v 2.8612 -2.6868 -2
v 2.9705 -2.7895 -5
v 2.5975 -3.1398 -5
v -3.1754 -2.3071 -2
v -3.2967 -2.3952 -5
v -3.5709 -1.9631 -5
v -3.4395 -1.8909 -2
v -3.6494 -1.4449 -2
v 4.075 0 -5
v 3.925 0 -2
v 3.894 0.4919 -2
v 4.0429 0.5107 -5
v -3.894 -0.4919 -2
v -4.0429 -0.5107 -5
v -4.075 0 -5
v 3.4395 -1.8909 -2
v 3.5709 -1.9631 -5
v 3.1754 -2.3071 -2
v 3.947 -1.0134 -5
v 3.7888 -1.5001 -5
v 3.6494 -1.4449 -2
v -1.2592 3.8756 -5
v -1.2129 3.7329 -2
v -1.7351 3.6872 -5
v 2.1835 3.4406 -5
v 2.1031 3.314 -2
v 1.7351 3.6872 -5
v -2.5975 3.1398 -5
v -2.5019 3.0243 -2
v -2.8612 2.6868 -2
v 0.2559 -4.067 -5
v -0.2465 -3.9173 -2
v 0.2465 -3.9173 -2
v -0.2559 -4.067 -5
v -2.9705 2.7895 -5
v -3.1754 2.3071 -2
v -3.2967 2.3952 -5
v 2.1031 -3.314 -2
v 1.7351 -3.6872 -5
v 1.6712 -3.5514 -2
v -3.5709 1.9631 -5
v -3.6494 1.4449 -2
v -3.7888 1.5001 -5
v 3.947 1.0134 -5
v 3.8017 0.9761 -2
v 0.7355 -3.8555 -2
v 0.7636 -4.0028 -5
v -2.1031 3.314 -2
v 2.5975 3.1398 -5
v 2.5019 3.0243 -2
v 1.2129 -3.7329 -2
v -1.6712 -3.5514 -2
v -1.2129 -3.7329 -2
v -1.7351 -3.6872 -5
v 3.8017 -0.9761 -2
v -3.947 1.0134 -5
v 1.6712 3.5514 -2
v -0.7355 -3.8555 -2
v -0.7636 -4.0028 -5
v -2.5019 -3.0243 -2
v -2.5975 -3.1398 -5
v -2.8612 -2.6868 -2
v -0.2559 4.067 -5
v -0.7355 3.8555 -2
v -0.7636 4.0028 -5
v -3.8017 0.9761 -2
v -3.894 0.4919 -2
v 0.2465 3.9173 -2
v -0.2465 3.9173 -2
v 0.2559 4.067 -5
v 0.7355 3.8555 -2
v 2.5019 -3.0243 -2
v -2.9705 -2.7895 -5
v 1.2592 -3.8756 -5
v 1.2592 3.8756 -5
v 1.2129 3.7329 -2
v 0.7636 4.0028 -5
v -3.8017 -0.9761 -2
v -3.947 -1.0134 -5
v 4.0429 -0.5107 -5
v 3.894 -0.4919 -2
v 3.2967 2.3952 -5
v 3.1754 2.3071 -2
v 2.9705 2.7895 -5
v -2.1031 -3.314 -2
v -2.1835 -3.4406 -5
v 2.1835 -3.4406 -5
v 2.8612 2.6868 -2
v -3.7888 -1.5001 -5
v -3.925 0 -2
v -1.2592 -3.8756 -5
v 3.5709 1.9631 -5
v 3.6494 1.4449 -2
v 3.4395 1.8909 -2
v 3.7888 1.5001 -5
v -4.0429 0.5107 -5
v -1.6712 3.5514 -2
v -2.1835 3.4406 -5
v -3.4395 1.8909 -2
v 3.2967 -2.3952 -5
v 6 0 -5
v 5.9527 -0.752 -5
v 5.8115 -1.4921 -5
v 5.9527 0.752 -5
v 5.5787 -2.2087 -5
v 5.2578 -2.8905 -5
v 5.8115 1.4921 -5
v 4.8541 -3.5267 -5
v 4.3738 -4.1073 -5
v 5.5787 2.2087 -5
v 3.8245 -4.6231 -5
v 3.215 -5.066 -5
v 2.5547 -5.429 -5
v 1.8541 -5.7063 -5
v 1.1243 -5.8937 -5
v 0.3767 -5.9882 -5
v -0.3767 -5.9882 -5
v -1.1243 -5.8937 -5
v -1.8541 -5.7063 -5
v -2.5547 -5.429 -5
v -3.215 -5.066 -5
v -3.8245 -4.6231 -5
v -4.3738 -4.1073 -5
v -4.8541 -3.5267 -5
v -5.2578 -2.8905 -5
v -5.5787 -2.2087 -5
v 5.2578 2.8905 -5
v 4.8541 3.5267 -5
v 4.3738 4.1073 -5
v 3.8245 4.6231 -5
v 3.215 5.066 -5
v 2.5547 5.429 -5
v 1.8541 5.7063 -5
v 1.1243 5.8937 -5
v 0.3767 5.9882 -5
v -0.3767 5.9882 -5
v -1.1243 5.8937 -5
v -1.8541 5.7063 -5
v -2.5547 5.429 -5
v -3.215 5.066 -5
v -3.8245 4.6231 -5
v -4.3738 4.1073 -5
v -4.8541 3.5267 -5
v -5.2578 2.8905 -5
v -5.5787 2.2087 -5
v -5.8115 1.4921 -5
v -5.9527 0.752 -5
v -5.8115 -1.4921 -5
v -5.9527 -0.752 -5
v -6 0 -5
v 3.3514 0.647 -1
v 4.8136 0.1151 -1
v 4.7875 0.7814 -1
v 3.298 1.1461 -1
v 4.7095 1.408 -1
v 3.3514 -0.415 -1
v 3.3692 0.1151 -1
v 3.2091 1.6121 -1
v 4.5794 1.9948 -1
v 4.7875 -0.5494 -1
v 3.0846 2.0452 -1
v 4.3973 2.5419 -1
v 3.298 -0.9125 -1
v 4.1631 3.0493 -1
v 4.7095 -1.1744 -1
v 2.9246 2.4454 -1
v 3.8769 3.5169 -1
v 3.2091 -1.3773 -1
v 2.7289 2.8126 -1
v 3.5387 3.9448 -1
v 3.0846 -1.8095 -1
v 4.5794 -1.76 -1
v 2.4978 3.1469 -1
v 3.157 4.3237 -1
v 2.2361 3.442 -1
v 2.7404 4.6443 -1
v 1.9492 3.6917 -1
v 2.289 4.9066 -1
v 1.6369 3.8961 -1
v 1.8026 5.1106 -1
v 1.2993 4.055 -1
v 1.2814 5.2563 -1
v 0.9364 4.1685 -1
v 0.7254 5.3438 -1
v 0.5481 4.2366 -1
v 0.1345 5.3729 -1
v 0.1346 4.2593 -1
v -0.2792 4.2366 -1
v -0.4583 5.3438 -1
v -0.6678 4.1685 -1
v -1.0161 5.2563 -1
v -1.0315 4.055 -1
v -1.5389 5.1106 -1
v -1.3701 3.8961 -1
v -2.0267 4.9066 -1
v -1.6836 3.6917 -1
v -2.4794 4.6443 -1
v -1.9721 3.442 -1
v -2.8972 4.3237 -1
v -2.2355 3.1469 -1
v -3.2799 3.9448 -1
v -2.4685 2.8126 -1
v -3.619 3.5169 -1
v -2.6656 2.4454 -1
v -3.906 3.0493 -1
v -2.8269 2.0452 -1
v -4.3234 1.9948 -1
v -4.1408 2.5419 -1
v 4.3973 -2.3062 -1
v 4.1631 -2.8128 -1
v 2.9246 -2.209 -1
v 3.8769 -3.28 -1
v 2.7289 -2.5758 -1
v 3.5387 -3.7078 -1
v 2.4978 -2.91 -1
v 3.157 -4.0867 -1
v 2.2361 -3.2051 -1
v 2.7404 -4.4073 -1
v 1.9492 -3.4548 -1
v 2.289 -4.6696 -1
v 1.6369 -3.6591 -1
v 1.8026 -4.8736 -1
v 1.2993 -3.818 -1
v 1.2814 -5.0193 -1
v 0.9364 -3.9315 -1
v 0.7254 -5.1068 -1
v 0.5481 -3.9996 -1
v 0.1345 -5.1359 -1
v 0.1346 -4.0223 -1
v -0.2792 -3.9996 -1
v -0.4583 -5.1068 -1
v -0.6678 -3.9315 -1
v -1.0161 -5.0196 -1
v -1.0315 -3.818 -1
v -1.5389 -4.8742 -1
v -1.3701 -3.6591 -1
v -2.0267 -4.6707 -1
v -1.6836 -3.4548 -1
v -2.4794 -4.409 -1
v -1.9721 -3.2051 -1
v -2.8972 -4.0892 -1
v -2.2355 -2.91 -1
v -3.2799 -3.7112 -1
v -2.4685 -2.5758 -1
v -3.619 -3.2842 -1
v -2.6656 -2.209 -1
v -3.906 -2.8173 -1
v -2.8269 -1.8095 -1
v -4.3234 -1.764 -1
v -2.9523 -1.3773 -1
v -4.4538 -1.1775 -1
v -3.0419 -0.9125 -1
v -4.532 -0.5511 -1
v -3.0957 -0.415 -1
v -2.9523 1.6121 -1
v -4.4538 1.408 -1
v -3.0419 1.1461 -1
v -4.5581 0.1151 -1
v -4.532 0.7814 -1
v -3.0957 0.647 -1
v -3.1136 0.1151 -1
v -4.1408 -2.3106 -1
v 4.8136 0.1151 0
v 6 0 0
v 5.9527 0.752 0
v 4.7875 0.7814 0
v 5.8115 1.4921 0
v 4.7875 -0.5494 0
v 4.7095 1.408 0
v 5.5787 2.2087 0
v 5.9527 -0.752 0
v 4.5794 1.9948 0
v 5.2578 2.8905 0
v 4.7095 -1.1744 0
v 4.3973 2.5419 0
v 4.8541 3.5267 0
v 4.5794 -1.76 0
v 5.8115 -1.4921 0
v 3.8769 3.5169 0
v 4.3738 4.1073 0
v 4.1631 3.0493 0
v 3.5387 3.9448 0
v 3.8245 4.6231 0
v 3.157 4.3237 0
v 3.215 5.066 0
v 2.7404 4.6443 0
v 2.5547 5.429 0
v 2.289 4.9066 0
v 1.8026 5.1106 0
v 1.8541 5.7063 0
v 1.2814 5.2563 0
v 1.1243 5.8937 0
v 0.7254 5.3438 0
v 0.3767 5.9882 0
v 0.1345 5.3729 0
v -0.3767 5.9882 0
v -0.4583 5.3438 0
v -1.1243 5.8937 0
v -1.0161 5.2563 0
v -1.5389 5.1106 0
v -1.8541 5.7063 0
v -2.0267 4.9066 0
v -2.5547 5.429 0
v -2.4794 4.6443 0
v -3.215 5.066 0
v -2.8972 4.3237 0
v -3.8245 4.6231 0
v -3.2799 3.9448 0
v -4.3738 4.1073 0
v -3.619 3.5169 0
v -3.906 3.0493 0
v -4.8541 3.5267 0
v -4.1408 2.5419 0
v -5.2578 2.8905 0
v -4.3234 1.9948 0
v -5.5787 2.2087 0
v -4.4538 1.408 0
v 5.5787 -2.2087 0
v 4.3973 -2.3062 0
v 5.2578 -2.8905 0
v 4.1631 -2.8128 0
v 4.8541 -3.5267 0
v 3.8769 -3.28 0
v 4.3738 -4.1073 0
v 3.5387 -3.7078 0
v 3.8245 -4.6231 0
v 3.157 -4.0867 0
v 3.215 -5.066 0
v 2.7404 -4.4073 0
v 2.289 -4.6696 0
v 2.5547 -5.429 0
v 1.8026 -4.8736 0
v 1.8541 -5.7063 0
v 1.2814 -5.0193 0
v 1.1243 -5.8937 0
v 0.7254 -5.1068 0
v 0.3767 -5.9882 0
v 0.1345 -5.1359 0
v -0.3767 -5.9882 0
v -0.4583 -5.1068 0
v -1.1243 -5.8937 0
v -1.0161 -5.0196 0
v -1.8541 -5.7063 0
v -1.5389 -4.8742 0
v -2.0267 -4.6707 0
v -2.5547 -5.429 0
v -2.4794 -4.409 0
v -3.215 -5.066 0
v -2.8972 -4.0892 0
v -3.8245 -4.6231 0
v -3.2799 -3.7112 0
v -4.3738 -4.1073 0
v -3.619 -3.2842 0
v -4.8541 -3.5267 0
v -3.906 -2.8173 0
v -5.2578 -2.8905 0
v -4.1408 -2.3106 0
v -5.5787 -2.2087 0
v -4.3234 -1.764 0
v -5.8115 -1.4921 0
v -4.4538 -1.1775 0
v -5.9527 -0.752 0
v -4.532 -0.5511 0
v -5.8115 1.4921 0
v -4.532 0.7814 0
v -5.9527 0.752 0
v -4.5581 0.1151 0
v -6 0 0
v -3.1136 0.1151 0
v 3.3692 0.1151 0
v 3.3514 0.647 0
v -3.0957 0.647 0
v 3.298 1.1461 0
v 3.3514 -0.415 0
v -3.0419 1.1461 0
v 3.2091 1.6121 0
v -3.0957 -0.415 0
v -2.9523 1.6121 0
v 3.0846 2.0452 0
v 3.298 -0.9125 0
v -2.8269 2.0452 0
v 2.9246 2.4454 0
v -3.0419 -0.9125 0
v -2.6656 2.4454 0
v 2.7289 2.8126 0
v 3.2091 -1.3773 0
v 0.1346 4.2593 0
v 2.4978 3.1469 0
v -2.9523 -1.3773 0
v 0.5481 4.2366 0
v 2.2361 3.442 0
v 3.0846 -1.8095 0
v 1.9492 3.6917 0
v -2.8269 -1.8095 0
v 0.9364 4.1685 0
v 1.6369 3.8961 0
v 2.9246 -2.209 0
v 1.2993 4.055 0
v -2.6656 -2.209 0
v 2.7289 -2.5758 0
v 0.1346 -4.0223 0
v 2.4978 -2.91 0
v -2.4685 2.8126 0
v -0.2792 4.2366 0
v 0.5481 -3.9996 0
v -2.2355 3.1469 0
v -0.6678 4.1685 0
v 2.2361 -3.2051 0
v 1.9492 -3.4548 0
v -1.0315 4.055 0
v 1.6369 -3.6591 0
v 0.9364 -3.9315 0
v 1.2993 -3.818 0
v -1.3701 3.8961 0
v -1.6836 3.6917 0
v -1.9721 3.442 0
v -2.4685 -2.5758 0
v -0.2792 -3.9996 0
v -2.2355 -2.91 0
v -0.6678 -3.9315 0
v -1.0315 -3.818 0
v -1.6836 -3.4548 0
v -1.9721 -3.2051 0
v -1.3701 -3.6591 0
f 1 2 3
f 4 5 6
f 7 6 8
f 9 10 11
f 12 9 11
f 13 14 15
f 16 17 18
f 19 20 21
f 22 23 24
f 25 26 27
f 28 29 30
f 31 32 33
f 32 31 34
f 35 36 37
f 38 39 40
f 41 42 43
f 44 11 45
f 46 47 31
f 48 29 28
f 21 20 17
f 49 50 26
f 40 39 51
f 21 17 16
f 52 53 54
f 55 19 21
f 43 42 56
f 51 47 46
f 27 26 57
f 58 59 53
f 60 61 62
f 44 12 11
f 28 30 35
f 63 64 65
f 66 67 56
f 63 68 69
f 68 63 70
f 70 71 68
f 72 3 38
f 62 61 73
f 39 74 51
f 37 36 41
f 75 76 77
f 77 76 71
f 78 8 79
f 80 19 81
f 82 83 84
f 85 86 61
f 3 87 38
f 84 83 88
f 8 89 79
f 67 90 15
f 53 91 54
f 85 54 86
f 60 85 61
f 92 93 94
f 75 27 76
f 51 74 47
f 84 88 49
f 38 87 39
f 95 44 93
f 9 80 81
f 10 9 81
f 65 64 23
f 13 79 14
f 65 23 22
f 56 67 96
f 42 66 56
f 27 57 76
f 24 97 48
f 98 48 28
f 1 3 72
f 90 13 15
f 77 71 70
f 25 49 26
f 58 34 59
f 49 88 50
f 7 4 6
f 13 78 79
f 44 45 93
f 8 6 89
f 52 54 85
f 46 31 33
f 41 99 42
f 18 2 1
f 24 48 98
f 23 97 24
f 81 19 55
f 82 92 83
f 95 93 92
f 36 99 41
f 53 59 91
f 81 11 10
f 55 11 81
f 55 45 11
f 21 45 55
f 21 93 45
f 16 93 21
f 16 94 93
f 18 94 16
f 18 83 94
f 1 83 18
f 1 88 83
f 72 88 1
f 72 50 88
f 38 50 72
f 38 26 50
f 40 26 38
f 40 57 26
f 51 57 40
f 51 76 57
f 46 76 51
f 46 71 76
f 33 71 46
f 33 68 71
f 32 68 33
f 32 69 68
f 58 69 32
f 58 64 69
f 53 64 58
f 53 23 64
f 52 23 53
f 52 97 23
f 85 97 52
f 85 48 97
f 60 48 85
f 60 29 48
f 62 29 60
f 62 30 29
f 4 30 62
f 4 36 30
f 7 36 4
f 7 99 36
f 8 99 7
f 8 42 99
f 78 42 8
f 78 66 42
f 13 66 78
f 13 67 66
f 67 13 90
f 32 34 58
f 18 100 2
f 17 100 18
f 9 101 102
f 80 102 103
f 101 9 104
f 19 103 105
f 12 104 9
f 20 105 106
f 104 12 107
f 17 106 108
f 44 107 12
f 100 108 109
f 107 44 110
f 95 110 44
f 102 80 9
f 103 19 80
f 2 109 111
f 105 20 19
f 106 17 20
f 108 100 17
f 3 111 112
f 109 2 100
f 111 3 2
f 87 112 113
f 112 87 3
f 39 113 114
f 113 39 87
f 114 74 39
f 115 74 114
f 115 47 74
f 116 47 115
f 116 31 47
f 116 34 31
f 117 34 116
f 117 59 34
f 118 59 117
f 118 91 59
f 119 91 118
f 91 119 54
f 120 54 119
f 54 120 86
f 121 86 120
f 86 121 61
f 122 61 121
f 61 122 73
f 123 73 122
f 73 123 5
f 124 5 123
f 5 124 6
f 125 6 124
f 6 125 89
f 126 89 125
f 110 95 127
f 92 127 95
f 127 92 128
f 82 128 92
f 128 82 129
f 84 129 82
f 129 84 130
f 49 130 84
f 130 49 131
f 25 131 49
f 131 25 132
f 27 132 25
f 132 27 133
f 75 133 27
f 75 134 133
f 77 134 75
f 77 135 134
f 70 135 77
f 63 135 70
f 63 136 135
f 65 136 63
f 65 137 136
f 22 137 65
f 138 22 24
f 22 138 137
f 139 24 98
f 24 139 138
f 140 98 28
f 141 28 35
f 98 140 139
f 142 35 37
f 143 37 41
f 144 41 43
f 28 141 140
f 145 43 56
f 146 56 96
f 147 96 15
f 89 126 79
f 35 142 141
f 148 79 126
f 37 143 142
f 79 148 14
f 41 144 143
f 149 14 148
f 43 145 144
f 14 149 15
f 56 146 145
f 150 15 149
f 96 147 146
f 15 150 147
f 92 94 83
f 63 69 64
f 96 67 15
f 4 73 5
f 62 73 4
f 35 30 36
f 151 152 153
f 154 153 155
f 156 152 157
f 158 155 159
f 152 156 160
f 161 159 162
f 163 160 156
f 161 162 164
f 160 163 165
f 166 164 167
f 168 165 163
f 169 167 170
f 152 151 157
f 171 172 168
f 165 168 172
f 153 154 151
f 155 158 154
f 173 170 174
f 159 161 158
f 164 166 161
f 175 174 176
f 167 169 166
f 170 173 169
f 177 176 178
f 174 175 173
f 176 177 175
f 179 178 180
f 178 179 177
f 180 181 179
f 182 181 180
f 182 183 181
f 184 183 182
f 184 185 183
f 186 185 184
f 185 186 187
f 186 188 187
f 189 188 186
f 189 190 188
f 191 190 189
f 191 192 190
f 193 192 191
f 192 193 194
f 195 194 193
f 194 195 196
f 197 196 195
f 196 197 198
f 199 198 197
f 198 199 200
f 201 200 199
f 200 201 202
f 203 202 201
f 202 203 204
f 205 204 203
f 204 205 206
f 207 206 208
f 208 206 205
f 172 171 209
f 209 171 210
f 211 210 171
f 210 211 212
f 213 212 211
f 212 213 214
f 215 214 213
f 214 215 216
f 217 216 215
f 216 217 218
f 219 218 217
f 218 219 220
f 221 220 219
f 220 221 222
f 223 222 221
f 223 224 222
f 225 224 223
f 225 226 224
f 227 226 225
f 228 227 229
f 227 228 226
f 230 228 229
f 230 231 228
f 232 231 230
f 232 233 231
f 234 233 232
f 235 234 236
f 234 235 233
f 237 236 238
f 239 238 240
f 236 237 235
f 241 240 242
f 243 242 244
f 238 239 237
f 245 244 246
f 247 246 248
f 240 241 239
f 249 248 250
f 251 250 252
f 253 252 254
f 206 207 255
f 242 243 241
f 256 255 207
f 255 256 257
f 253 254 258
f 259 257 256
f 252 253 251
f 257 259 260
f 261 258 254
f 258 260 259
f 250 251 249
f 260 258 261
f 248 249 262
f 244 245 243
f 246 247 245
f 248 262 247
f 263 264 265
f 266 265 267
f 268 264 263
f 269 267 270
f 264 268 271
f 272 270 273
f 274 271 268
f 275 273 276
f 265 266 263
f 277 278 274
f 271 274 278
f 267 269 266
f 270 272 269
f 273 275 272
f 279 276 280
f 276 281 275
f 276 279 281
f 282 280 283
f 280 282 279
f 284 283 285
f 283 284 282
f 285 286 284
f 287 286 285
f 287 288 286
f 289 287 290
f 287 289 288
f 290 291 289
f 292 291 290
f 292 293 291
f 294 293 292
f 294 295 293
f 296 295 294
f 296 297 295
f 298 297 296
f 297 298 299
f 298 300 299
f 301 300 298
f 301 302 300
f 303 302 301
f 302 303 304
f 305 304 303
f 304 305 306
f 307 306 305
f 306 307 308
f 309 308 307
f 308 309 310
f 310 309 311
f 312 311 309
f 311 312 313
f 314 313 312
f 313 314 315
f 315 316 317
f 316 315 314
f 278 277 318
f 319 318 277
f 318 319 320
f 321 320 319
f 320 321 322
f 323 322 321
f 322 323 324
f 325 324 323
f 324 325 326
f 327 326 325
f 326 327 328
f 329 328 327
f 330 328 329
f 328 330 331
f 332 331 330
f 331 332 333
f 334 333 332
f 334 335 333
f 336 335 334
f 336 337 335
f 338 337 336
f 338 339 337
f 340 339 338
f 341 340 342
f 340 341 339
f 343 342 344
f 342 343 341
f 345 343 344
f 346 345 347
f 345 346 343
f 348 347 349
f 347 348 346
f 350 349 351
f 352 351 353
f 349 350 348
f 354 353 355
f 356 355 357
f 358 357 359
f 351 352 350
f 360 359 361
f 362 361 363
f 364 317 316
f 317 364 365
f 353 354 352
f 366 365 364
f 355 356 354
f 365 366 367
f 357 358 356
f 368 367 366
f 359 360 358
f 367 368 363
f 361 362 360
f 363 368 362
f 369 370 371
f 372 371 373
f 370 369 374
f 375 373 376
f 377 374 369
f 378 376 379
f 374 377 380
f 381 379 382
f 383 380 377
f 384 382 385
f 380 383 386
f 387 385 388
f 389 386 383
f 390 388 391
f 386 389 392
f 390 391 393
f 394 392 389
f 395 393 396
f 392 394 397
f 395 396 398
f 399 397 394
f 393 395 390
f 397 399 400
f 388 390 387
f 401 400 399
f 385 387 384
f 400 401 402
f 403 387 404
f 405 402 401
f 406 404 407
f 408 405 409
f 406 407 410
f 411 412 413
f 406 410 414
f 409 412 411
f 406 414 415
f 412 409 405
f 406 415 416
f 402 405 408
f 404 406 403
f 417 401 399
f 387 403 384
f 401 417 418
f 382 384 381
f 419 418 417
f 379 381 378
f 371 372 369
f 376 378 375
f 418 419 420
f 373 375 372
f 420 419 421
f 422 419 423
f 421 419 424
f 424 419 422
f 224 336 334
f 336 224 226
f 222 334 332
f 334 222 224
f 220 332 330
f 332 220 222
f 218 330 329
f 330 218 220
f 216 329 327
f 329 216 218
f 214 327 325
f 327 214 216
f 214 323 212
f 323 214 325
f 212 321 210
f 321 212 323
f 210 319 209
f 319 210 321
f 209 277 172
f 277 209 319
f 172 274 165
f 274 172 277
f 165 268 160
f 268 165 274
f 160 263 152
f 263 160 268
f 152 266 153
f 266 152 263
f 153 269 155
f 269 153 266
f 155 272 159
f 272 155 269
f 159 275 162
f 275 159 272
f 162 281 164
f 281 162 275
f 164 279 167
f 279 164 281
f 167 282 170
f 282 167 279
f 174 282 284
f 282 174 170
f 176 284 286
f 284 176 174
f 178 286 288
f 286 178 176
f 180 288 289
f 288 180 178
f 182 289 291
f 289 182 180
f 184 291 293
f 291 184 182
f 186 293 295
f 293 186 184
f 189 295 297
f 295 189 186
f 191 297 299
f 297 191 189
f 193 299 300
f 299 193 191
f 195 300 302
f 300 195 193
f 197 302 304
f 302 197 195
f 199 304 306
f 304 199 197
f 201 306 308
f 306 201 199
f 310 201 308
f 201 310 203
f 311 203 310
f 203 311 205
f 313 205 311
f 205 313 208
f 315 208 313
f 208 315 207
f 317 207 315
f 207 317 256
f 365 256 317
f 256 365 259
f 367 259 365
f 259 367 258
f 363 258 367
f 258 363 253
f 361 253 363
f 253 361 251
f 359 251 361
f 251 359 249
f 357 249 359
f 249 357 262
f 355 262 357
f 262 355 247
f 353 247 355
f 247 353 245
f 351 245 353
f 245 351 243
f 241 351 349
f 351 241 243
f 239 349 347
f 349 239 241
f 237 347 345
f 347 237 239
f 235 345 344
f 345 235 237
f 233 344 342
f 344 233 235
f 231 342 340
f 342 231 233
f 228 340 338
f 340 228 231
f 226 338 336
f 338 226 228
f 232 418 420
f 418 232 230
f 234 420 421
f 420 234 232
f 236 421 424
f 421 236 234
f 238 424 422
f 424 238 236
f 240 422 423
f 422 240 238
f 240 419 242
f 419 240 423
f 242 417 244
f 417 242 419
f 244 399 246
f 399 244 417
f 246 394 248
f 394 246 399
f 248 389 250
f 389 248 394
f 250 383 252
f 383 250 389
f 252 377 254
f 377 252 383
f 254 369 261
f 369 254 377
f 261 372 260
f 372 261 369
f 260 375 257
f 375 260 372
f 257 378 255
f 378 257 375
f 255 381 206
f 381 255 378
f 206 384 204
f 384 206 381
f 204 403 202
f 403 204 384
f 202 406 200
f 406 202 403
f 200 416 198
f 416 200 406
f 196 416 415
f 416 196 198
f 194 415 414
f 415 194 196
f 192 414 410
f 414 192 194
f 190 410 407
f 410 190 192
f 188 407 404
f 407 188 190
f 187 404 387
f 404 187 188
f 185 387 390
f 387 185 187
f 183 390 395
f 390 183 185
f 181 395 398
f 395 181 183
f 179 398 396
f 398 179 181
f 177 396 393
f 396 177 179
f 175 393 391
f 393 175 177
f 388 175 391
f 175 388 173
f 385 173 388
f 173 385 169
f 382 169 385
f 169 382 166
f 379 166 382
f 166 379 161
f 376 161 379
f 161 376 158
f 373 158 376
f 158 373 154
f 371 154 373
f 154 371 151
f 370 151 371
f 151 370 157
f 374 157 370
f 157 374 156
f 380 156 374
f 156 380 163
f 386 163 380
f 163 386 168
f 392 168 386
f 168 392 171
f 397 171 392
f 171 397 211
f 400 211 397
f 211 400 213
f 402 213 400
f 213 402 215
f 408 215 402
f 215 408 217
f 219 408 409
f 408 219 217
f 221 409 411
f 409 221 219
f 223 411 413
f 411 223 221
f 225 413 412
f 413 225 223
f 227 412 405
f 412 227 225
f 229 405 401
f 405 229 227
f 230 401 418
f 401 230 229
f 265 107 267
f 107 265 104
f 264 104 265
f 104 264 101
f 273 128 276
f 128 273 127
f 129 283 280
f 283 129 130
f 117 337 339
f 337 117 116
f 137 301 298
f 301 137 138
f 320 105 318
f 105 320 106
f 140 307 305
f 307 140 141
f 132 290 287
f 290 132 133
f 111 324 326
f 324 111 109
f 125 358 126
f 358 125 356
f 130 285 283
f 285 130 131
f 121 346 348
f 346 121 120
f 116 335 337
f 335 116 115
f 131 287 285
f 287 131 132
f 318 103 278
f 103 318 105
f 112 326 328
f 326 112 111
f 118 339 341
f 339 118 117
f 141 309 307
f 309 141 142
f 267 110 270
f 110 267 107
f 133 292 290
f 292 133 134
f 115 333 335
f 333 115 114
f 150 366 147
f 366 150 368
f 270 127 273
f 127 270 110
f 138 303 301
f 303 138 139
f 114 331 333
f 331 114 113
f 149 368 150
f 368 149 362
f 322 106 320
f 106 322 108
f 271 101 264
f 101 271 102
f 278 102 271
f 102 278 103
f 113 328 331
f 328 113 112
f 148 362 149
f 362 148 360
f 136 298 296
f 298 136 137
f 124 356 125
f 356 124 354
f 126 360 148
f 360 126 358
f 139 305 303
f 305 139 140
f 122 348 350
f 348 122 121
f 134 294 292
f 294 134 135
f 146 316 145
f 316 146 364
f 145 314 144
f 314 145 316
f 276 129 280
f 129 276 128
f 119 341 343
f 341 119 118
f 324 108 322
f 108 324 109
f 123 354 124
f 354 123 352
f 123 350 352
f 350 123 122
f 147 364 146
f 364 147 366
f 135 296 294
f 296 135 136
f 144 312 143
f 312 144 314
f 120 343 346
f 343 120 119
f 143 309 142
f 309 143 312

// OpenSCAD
$fn = 50;

difference() {
	union() {
		translate(v = [0, 0, -5.0]) {
			cylinder(h = 5, r = 6.0);
		}
	}
	union() {
		#translate(v = [0, 0, -5.0]) {
			cylinder(h = 3, r1 = 4.075, r2 = 3.925);
		}
		translate(v = [0, 0, -1]) {
			linear_extrude(height = 1) {
				text(font = "Impact", halign = "center", size = 10, text = "O", valign = "center");
			}
		}
	}
}
